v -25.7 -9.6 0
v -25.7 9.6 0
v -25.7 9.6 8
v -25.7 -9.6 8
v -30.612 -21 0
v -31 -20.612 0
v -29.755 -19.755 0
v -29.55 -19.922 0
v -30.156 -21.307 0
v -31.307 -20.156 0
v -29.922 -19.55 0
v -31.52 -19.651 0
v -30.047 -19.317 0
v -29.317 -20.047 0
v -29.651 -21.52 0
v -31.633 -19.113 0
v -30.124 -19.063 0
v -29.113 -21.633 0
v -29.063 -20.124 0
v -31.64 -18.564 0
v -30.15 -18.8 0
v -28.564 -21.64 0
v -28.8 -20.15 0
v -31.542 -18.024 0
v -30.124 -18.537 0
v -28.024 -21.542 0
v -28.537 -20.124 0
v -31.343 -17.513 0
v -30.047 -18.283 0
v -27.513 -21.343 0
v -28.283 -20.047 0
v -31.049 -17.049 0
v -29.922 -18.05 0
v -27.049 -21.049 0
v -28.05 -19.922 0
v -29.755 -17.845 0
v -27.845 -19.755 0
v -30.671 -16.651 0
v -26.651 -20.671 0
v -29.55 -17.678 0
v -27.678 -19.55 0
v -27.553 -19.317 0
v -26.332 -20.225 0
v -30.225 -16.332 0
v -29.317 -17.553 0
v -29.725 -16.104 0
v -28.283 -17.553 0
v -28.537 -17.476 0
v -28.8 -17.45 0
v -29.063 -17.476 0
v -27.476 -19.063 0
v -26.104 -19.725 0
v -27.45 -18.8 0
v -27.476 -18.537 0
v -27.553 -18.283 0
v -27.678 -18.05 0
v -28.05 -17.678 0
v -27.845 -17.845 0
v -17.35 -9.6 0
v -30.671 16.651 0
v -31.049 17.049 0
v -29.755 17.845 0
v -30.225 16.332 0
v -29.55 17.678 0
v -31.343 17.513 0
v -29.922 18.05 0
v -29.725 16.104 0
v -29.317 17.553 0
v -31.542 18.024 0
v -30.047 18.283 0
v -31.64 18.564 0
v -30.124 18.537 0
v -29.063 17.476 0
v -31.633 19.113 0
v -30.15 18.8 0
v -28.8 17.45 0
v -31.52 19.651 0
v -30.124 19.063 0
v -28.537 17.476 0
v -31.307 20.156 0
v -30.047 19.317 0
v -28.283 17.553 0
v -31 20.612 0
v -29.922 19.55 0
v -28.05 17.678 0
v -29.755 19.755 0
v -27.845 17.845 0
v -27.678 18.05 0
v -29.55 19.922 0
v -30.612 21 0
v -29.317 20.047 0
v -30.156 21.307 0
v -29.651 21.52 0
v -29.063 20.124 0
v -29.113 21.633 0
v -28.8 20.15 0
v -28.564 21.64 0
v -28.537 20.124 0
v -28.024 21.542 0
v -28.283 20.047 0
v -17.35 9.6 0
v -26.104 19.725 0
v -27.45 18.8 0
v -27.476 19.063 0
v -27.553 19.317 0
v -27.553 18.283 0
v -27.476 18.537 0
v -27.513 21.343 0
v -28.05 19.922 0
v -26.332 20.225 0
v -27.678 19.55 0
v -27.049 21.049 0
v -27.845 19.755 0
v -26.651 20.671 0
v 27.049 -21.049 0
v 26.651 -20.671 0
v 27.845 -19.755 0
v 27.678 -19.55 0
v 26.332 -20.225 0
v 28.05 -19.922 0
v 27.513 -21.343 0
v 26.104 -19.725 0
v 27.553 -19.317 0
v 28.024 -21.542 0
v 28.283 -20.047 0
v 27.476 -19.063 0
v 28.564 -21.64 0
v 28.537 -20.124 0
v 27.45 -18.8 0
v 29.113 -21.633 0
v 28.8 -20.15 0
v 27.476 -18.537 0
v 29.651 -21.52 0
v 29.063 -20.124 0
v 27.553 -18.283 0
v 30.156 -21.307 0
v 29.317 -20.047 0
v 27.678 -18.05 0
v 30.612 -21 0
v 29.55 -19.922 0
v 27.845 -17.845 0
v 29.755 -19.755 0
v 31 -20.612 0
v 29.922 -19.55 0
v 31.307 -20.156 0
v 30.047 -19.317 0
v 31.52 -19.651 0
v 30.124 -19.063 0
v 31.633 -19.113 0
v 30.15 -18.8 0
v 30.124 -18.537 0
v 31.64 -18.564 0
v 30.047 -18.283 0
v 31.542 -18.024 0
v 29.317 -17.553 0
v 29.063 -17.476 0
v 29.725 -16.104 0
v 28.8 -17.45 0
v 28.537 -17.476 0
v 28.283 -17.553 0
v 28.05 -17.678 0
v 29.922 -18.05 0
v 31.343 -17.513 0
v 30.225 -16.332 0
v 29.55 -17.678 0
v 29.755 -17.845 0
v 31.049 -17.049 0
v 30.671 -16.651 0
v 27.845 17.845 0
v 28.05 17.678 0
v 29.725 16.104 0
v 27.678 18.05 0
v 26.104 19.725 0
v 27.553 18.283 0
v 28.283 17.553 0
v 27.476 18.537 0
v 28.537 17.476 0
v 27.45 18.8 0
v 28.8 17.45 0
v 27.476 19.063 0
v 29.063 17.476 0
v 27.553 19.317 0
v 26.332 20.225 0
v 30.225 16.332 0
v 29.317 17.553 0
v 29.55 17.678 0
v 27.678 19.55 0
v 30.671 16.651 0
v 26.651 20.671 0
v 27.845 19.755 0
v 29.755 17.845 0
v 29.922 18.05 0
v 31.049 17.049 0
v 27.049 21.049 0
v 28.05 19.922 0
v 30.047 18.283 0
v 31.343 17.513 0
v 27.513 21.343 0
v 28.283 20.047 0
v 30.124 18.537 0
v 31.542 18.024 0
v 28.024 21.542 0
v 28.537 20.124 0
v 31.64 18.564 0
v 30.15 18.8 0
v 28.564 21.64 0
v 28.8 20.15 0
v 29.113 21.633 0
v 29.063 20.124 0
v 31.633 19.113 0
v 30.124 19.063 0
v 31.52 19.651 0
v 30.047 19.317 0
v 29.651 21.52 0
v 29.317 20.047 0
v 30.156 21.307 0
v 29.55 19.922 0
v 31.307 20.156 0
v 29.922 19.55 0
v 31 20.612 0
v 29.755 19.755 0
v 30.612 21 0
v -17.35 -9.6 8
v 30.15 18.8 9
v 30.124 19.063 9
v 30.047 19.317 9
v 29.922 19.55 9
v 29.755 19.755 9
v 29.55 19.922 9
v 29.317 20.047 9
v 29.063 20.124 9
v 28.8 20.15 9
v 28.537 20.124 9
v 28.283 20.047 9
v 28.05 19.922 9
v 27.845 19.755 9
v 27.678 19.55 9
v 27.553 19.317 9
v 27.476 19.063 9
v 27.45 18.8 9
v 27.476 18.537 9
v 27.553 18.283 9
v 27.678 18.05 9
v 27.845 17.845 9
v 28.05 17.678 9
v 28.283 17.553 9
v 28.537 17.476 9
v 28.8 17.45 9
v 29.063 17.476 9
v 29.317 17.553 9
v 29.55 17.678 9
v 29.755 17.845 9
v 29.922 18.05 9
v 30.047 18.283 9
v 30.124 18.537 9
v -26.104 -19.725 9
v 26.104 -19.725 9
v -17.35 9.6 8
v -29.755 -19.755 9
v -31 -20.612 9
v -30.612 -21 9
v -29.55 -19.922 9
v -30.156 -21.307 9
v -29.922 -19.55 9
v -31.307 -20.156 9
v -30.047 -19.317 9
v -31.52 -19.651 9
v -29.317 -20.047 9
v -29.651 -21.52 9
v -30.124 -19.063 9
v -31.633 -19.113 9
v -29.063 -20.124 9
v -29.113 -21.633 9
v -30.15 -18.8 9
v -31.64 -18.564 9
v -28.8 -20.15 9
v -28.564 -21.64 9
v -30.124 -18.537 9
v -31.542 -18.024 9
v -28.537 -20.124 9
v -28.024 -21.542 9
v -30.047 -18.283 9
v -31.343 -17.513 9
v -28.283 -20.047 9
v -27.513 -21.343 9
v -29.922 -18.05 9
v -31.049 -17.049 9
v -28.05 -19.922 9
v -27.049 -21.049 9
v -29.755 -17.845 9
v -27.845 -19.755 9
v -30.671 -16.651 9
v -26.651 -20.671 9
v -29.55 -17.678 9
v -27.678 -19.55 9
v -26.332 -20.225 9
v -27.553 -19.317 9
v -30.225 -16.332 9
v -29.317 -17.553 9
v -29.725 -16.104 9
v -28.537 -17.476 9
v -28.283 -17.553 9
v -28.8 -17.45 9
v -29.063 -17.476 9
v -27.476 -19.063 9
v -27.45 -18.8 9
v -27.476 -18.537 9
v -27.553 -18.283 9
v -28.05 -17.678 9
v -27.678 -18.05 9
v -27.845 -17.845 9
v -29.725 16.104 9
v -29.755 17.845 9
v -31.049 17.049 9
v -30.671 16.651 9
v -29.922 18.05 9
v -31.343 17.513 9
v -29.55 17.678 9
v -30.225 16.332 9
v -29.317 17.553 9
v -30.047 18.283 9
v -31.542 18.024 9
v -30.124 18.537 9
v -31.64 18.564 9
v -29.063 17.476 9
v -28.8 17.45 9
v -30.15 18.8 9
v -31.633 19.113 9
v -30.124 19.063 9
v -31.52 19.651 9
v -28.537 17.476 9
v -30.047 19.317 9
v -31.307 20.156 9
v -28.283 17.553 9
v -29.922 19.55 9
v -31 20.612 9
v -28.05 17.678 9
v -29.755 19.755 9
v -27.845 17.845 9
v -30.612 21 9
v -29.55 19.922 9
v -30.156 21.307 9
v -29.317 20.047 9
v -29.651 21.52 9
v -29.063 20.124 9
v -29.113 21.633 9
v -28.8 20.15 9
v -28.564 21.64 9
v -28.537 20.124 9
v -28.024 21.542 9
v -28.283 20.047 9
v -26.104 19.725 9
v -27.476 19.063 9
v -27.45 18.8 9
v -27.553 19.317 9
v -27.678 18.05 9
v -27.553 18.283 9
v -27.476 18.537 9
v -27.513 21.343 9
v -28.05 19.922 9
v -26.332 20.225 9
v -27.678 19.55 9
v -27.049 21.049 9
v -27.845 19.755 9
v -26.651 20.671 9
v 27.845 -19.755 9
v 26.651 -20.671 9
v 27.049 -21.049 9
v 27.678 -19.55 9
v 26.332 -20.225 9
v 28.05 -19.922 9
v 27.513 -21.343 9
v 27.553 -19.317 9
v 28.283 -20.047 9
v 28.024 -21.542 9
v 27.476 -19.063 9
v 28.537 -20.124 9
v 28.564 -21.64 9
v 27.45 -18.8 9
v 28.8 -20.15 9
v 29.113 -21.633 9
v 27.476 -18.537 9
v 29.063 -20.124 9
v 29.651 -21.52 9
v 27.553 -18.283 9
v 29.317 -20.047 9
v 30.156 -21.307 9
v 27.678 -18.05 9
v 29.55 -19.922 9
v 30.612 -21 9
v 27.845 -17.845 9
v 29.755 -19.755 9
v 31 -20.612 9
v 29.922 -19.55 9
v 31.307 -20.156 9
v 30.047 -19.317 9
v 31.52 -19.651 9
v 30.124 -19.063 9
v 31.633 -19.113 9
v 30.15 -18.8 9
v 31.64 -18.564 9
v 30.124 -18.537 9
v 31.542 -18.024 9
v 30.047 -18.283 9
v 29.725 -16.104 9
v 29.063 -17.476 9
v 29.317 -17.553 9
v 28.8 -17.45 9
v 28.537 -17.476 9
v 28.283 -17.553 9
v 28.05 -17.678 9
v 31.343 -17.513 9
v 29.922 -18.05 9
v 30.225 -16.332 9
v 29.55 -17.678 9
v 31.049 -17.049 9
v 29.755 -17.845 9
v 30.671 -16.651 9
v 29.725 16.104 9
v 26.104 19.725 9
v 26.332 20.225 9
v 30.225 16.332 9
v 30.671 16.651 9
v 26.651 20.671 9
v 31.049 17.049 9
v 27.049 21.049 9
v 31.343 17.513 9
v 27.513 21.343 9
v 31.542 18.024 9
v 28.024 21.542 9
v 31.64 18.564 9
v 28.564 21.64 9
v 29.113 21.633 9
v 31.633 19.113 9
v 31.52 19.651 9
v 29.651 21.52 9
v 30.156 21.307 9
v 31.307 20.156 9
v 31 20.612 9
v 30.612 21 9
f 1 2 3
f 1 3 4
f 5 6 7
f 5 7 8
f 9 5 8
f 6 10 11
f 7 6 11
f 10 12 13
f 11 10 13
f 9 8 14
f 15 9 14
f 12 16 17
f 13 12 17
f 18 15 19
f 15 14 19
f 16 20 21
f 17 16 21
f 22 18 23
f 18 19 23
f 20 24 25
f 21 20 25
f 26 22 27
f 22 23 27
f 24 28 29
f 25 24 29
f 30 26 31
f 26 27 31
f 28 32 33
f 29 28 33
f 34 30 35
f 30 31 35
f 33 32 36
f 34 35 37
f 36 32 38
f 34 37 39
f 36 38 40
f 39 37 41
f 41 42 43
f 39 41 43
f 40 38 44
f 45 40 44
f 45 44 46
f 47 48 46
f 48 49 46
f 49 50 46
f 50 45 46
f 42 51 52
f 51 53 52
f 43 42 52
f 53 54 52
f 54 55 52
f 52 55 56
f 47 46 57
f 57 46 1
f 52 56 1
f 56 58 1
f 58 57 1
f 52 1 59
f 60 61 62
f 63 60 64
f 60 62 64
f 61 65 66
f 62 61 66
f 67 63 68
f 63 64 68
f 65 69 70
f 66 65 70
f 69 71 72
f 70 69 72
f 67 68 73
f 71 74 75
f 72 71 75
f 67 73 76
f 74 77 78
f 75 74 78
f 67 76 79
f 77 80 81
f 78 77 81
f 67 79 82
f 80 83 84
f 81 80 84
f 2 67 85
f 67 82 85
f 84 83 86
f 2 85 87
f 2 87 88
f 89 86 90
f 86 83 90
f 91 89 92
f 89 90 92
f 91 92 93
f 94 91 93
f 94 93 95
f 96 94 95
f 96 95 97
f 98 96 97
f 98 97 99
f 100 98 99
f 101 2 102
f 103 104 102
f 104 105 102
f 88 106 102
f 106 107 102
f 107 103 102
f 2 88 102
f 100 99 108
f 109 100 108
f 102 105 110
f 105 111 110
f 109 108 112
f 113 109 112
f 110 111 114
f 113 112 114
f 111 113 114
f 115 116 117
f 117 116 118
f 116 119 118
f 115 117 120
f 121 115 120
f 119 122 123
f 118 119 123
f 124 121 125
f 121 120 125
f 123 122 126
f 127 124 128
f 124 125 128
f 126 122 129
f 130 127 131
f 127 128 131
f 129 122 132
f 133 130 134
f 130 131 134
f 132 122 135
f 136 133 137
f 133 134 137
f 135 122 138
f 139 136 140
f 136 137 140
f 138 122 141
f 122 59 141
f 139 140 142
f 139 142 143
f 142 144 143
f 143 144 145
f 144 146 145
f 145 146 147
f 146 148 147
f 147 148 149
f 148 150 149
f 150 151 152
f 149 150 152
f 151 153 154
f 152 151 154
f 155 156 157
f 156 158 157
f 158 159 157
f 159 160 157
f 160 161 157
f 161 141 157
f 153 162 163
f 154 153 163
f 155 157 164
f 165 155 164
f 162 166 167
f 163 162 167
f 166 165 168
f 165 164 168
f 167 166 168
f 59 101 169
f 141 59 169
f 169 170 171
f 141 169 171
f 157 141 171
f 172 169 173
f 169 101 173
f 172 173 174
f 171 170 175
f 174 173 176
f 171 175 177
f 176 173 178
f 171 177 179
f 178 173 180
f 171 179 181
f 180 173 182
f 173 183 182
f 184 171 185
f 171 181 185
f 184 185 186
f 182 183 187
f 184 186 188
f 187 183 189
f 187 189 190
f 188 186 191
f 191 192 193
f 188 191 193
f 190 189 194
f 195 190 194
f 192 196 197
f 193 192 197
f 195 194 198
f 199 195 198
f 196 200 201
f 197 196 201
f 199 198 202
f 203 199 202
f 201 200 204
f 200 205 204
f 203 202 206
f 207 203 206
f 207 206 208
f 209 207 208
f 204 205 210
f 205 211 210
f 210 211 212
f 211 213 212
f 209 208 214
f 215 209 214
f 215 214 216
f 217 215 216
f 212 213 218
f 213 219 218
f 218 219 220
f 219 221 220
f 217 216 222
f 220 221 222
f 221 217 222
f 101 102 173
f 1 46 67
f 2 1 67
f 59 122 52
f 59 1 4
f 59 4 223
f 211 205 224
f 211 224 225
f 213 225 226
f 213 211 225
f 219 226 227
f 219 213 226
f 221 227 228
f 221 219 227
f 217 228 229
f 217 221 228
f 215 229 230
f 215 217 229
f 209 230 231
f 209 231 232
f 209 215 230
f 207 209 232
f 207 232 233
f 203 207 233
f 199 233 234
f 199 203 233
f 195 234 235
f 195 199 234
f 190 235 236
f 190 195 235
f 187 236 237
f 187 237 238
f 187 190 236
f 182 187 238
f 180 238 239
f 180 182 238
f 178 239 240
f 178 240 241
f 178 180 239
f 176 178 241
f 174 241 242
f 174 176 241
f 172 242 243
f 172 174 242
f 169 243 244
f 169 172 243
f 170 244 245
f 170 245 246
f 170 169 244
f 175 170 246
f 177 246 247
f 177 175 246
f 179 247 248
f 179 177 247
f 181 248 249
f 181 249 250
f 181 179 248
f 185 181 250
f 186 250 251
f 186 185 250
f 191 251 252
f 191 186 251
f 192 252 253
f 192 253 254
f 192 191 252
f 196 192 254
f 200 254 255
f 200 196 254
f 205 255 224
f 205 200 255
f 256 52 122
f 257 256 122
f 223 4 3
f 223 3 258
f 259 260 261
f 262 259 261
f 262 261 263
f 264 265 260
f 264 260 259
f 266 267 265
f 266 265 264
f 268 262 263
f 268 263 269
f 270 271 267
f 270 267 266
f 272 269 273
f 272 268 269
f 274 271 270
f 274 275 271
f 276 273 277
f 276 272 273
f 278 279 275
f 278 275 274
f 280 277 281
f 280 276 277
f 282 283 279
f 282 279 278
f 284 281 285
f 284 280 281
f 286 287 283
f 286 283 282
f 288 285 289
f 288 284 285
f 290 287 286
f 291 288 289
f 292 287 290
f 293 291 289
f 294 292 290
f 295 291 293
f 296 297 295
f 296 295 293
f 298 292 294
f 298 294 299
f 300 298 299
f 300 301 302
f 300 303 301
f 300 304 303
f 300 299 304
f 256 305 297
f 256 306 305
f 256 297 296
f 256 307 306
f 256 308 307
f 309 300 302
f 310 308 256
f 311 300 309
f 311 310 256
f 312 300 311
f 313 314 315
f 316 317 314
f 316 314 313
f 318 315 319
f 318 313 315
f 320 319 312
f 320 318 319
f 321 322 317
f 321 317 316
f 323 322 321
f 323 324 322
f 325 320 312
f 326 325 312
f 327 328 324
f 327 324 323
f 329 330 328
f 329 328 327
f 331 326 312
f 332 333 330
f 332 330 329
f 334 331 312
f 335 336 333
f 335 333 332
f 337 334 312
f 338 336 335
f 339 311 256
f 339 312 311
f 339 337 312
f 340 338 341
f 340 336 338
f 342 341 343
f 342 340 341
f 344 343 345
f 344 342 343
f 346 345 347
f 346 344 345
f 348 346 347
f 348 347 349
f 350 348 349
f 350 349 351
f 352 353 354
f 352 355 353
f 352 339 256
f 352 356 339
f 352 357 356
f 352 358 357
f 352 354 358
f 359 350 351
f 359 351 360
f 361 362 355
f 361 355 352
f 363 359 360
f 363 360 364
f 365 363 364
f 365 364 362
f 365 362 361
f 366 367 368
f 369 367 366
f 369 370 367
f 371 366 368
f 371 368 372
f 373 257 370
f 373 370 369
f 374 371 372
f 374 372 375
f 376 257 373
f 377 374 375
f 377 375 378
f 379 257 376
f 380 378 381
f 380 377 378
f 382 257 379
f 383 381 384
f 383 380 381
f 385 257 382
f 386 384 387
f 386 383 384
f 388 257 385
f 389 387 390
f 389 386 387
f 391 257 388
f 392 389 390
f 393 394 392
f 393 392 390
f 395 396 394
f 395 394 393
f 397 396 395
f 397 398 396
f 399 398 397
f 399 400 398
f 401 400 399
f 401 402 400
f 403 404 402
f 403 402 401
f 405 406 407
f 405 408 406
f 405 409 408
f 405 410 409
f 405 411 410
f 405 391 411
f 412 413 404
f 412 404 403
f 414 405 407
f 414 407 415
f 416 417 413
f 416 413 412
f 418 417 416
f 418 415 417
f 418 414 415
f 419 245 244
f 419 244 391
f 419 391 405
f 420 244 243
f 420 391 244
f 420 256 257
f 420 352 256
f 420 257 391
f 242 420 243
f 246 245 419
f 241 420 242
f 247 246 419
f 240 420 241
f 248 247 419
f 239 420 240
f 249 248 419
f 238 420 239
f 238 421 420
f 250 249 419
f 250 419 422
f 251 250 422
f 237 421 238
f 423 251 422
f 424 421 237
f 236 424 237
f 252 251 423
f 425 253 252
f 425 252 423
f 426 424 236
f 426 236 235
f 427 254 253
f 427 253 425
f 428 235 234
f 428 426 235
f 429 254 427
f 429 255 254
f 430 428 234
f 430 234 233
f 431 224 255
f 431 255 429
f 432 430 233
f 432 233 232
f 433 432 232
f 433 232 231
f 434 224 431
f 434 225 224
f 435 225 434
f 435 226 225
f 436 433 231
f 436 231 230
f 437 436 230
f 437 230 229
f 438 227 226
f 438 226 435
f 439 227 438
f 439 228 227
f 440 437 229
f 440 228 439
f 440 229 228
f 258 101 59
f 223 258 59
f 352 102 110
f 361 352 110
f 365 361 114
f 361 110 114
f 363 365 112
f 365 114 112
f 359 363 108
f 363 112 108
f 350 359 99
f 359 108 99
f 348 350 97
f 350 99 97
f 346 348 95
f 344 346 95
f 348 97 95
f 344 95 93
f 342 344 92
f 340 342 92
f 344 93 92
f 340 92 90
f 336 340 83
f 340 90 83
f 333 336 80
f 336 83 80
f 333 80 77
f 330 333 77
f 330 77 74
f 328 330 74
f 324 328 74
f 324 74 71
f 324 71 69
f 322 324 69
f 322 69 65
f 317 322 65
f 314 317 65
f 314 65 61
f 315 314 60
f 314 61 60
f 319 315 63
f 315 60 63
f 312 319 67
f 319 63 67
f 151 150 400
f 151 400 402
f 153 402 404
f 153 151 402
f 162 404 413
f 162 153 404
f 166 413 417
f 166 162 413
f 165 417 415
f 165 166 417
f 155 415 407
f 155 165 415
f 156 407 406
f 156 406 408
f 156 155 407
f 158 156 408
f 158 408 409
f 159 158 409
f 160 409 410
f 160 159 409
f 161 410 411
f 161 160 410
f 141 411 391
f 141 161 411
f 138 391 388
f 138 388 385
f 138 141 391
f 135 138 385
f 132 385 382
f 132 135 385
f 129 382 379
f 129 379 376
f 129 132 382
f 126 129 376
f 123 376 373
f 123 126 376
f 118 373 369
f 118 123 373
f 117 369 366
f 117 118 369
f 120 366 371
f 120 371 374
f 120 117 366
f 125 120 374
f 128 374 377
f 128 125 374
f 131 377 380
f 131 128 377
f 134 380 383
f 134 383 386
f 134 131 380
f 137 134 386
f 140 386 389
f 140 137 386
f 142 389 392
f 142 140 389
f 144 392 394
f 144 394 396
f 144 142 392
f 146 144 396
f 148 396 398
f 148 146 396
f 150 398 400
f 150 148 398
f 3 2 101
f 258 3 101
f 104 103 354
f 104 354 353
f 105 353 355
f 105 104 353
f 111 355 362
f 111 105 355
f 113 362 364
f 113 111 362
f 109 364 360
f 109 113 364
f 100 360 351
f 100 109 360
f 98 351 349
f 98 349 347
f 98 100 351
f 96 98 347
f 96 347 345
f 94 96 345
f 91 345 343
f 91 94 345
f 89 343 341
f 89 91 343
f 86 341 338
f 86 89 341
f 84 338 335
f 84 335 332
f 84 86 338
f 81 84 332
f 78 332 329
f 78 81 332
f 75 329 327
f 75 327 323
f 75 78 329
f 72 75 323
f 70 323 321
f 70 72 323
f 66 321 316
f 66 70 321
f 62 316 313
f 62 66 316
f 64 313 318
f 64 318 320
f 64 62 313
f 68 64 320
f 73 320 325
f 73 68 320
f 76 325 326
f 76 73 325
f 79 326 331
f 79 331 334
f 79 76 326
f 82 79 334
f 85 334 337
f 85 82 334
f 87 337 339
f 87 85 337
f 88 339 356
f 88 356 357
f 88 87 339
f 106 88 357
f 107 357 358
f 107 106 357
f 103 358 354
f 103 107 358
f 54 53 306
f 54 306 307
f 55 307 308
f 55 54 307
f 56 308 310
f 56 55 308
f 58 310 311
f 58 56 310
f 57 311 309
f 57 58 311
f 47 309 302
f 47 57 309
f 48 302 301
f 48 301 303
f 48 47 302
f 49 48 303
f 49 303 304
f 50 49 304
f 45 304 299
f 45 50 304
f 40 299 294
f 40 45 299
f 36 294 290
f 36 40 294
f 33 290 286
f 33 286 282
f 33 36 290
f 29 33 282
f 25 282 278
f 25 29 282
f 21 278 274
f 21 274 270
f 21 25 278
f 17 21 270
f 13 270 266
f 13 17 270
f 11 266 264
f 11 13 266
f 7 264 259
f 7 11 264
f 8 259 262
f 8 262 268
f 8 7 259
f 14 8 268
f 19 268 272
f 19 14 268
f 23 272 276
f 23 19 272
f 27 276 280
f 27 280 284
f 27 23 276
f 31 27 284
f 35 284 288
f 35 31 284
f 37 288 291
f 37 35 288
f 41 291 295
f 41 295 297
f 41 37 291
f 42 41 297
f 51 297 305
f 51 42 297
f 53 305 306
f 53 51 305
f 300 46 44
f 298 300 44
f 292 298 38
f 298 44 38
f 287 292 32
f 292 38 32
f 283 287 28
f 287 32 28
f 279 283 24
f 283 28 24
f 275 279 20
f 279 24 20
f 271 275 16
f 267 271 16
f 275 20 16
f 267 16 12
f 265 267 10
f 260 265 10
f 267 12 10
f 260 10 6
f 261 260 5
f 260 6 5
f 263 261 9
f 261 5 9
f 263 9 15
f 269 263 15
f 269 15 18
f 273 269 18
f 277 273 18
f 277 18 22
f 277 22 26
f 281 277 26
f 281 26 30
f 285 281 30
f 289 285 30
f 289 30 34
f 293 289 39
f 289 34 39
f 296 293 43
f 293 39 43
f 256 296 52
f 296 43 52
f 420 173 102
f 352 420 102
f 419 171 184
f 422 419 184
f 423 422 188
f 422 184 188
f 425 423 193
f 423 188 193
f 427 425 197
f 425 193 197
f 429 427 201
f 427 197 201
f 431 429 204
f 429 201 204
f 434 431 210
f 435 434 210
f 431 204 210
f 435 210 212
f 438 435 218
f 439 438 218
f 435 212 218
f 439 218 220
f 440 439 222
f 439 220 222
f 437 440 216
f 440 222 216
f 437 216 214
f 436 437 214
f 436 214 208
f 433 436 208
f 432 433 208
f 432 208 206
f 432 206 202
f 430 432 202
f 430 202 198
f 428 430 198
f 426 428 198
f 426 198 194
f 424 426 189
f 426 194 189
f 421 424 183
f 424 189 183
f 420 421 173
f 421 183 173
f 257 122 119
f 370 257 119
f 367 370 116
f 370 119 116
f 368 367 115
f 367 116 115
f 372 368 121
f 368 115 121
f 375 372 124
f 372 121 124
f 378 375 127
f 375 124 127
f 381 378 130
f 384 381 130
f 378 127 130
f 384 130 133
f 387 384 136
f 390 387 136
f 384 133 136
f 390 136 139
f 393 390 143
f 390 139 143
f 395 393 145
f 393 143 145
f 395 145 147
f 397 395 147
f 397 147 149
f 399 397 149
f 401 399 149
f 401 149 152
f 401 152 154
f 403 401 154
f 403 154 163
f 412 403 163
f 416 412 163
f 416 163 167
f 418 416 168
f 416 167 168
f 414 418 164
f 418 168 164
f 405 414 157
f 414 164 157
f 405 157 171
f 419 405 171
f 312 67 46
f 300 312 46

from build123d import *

# Parameters (mm, degrees)
F0_R     = 1.35
F1_DEPTH = 9
F2_W     = 8.35
F2_H     = 19.2
F3_DEPTH = 8


with BuildPart() as f1:
    # F0 (on Top) → F1 (new body)
    with BuildSketch(Plane.XY):
        with BuildLine():
            Line((26.104286, 19.725), (-26.104286, 19.725))
            ThreePointArc((-26.104286, 19.725), (-30.815254, 20.815254), (-29.725, 16.104286))
            Line((-29.725, 16.104286), (-29.725, -16.104286))
            ThreePointArc((-29.725, -16.104286), (-30.815254, -20.815254), (-26.104286, -19.725))
            Line((-26.104286, -19.725), (26.104286, -19.725))
            ThreePointArc((26.104286, -19.725), (30.815254, -20.815254), (29.725, -16.104286))
            Line((29.725, -16.104286), (29.725, 16.104286))
            ThreePointArc((29.725, 16.104286), (30.815254, 20.815254), (26.104286, 19.725))
        make_face()
        with Locations((-28.8, -18.8)):
            Circle(F0_R, mode=Mode.SUBTRACT)
        with Locations((28.8, -18.8)):
            Circle(F0_R, mode=Mode.SUBTRACT)
        with Locations((-28.8, 18.8)):
            Circle(F0_R, mode=Mode.SUBTRACT)
        with Locations((28.8, 18.8)):
            Circle(F0_R, mode=Mode.SUBTRACT)
    extrude(amount=F1_DEPTH)

    # F2 (on face) → F3 (cut)
    with BuildSketch(Plane(origin=(0, 0, 0), x_dir=(1, 0, 0), z_dir=(0, 0, -1))):
        with Locations((-21.525, 0)):
            Rectangle(F2_W, F2_H)
    extrude(amount=-F3_DEPTH, mode=Mode.SUBTRACT)


solid = f1.part
